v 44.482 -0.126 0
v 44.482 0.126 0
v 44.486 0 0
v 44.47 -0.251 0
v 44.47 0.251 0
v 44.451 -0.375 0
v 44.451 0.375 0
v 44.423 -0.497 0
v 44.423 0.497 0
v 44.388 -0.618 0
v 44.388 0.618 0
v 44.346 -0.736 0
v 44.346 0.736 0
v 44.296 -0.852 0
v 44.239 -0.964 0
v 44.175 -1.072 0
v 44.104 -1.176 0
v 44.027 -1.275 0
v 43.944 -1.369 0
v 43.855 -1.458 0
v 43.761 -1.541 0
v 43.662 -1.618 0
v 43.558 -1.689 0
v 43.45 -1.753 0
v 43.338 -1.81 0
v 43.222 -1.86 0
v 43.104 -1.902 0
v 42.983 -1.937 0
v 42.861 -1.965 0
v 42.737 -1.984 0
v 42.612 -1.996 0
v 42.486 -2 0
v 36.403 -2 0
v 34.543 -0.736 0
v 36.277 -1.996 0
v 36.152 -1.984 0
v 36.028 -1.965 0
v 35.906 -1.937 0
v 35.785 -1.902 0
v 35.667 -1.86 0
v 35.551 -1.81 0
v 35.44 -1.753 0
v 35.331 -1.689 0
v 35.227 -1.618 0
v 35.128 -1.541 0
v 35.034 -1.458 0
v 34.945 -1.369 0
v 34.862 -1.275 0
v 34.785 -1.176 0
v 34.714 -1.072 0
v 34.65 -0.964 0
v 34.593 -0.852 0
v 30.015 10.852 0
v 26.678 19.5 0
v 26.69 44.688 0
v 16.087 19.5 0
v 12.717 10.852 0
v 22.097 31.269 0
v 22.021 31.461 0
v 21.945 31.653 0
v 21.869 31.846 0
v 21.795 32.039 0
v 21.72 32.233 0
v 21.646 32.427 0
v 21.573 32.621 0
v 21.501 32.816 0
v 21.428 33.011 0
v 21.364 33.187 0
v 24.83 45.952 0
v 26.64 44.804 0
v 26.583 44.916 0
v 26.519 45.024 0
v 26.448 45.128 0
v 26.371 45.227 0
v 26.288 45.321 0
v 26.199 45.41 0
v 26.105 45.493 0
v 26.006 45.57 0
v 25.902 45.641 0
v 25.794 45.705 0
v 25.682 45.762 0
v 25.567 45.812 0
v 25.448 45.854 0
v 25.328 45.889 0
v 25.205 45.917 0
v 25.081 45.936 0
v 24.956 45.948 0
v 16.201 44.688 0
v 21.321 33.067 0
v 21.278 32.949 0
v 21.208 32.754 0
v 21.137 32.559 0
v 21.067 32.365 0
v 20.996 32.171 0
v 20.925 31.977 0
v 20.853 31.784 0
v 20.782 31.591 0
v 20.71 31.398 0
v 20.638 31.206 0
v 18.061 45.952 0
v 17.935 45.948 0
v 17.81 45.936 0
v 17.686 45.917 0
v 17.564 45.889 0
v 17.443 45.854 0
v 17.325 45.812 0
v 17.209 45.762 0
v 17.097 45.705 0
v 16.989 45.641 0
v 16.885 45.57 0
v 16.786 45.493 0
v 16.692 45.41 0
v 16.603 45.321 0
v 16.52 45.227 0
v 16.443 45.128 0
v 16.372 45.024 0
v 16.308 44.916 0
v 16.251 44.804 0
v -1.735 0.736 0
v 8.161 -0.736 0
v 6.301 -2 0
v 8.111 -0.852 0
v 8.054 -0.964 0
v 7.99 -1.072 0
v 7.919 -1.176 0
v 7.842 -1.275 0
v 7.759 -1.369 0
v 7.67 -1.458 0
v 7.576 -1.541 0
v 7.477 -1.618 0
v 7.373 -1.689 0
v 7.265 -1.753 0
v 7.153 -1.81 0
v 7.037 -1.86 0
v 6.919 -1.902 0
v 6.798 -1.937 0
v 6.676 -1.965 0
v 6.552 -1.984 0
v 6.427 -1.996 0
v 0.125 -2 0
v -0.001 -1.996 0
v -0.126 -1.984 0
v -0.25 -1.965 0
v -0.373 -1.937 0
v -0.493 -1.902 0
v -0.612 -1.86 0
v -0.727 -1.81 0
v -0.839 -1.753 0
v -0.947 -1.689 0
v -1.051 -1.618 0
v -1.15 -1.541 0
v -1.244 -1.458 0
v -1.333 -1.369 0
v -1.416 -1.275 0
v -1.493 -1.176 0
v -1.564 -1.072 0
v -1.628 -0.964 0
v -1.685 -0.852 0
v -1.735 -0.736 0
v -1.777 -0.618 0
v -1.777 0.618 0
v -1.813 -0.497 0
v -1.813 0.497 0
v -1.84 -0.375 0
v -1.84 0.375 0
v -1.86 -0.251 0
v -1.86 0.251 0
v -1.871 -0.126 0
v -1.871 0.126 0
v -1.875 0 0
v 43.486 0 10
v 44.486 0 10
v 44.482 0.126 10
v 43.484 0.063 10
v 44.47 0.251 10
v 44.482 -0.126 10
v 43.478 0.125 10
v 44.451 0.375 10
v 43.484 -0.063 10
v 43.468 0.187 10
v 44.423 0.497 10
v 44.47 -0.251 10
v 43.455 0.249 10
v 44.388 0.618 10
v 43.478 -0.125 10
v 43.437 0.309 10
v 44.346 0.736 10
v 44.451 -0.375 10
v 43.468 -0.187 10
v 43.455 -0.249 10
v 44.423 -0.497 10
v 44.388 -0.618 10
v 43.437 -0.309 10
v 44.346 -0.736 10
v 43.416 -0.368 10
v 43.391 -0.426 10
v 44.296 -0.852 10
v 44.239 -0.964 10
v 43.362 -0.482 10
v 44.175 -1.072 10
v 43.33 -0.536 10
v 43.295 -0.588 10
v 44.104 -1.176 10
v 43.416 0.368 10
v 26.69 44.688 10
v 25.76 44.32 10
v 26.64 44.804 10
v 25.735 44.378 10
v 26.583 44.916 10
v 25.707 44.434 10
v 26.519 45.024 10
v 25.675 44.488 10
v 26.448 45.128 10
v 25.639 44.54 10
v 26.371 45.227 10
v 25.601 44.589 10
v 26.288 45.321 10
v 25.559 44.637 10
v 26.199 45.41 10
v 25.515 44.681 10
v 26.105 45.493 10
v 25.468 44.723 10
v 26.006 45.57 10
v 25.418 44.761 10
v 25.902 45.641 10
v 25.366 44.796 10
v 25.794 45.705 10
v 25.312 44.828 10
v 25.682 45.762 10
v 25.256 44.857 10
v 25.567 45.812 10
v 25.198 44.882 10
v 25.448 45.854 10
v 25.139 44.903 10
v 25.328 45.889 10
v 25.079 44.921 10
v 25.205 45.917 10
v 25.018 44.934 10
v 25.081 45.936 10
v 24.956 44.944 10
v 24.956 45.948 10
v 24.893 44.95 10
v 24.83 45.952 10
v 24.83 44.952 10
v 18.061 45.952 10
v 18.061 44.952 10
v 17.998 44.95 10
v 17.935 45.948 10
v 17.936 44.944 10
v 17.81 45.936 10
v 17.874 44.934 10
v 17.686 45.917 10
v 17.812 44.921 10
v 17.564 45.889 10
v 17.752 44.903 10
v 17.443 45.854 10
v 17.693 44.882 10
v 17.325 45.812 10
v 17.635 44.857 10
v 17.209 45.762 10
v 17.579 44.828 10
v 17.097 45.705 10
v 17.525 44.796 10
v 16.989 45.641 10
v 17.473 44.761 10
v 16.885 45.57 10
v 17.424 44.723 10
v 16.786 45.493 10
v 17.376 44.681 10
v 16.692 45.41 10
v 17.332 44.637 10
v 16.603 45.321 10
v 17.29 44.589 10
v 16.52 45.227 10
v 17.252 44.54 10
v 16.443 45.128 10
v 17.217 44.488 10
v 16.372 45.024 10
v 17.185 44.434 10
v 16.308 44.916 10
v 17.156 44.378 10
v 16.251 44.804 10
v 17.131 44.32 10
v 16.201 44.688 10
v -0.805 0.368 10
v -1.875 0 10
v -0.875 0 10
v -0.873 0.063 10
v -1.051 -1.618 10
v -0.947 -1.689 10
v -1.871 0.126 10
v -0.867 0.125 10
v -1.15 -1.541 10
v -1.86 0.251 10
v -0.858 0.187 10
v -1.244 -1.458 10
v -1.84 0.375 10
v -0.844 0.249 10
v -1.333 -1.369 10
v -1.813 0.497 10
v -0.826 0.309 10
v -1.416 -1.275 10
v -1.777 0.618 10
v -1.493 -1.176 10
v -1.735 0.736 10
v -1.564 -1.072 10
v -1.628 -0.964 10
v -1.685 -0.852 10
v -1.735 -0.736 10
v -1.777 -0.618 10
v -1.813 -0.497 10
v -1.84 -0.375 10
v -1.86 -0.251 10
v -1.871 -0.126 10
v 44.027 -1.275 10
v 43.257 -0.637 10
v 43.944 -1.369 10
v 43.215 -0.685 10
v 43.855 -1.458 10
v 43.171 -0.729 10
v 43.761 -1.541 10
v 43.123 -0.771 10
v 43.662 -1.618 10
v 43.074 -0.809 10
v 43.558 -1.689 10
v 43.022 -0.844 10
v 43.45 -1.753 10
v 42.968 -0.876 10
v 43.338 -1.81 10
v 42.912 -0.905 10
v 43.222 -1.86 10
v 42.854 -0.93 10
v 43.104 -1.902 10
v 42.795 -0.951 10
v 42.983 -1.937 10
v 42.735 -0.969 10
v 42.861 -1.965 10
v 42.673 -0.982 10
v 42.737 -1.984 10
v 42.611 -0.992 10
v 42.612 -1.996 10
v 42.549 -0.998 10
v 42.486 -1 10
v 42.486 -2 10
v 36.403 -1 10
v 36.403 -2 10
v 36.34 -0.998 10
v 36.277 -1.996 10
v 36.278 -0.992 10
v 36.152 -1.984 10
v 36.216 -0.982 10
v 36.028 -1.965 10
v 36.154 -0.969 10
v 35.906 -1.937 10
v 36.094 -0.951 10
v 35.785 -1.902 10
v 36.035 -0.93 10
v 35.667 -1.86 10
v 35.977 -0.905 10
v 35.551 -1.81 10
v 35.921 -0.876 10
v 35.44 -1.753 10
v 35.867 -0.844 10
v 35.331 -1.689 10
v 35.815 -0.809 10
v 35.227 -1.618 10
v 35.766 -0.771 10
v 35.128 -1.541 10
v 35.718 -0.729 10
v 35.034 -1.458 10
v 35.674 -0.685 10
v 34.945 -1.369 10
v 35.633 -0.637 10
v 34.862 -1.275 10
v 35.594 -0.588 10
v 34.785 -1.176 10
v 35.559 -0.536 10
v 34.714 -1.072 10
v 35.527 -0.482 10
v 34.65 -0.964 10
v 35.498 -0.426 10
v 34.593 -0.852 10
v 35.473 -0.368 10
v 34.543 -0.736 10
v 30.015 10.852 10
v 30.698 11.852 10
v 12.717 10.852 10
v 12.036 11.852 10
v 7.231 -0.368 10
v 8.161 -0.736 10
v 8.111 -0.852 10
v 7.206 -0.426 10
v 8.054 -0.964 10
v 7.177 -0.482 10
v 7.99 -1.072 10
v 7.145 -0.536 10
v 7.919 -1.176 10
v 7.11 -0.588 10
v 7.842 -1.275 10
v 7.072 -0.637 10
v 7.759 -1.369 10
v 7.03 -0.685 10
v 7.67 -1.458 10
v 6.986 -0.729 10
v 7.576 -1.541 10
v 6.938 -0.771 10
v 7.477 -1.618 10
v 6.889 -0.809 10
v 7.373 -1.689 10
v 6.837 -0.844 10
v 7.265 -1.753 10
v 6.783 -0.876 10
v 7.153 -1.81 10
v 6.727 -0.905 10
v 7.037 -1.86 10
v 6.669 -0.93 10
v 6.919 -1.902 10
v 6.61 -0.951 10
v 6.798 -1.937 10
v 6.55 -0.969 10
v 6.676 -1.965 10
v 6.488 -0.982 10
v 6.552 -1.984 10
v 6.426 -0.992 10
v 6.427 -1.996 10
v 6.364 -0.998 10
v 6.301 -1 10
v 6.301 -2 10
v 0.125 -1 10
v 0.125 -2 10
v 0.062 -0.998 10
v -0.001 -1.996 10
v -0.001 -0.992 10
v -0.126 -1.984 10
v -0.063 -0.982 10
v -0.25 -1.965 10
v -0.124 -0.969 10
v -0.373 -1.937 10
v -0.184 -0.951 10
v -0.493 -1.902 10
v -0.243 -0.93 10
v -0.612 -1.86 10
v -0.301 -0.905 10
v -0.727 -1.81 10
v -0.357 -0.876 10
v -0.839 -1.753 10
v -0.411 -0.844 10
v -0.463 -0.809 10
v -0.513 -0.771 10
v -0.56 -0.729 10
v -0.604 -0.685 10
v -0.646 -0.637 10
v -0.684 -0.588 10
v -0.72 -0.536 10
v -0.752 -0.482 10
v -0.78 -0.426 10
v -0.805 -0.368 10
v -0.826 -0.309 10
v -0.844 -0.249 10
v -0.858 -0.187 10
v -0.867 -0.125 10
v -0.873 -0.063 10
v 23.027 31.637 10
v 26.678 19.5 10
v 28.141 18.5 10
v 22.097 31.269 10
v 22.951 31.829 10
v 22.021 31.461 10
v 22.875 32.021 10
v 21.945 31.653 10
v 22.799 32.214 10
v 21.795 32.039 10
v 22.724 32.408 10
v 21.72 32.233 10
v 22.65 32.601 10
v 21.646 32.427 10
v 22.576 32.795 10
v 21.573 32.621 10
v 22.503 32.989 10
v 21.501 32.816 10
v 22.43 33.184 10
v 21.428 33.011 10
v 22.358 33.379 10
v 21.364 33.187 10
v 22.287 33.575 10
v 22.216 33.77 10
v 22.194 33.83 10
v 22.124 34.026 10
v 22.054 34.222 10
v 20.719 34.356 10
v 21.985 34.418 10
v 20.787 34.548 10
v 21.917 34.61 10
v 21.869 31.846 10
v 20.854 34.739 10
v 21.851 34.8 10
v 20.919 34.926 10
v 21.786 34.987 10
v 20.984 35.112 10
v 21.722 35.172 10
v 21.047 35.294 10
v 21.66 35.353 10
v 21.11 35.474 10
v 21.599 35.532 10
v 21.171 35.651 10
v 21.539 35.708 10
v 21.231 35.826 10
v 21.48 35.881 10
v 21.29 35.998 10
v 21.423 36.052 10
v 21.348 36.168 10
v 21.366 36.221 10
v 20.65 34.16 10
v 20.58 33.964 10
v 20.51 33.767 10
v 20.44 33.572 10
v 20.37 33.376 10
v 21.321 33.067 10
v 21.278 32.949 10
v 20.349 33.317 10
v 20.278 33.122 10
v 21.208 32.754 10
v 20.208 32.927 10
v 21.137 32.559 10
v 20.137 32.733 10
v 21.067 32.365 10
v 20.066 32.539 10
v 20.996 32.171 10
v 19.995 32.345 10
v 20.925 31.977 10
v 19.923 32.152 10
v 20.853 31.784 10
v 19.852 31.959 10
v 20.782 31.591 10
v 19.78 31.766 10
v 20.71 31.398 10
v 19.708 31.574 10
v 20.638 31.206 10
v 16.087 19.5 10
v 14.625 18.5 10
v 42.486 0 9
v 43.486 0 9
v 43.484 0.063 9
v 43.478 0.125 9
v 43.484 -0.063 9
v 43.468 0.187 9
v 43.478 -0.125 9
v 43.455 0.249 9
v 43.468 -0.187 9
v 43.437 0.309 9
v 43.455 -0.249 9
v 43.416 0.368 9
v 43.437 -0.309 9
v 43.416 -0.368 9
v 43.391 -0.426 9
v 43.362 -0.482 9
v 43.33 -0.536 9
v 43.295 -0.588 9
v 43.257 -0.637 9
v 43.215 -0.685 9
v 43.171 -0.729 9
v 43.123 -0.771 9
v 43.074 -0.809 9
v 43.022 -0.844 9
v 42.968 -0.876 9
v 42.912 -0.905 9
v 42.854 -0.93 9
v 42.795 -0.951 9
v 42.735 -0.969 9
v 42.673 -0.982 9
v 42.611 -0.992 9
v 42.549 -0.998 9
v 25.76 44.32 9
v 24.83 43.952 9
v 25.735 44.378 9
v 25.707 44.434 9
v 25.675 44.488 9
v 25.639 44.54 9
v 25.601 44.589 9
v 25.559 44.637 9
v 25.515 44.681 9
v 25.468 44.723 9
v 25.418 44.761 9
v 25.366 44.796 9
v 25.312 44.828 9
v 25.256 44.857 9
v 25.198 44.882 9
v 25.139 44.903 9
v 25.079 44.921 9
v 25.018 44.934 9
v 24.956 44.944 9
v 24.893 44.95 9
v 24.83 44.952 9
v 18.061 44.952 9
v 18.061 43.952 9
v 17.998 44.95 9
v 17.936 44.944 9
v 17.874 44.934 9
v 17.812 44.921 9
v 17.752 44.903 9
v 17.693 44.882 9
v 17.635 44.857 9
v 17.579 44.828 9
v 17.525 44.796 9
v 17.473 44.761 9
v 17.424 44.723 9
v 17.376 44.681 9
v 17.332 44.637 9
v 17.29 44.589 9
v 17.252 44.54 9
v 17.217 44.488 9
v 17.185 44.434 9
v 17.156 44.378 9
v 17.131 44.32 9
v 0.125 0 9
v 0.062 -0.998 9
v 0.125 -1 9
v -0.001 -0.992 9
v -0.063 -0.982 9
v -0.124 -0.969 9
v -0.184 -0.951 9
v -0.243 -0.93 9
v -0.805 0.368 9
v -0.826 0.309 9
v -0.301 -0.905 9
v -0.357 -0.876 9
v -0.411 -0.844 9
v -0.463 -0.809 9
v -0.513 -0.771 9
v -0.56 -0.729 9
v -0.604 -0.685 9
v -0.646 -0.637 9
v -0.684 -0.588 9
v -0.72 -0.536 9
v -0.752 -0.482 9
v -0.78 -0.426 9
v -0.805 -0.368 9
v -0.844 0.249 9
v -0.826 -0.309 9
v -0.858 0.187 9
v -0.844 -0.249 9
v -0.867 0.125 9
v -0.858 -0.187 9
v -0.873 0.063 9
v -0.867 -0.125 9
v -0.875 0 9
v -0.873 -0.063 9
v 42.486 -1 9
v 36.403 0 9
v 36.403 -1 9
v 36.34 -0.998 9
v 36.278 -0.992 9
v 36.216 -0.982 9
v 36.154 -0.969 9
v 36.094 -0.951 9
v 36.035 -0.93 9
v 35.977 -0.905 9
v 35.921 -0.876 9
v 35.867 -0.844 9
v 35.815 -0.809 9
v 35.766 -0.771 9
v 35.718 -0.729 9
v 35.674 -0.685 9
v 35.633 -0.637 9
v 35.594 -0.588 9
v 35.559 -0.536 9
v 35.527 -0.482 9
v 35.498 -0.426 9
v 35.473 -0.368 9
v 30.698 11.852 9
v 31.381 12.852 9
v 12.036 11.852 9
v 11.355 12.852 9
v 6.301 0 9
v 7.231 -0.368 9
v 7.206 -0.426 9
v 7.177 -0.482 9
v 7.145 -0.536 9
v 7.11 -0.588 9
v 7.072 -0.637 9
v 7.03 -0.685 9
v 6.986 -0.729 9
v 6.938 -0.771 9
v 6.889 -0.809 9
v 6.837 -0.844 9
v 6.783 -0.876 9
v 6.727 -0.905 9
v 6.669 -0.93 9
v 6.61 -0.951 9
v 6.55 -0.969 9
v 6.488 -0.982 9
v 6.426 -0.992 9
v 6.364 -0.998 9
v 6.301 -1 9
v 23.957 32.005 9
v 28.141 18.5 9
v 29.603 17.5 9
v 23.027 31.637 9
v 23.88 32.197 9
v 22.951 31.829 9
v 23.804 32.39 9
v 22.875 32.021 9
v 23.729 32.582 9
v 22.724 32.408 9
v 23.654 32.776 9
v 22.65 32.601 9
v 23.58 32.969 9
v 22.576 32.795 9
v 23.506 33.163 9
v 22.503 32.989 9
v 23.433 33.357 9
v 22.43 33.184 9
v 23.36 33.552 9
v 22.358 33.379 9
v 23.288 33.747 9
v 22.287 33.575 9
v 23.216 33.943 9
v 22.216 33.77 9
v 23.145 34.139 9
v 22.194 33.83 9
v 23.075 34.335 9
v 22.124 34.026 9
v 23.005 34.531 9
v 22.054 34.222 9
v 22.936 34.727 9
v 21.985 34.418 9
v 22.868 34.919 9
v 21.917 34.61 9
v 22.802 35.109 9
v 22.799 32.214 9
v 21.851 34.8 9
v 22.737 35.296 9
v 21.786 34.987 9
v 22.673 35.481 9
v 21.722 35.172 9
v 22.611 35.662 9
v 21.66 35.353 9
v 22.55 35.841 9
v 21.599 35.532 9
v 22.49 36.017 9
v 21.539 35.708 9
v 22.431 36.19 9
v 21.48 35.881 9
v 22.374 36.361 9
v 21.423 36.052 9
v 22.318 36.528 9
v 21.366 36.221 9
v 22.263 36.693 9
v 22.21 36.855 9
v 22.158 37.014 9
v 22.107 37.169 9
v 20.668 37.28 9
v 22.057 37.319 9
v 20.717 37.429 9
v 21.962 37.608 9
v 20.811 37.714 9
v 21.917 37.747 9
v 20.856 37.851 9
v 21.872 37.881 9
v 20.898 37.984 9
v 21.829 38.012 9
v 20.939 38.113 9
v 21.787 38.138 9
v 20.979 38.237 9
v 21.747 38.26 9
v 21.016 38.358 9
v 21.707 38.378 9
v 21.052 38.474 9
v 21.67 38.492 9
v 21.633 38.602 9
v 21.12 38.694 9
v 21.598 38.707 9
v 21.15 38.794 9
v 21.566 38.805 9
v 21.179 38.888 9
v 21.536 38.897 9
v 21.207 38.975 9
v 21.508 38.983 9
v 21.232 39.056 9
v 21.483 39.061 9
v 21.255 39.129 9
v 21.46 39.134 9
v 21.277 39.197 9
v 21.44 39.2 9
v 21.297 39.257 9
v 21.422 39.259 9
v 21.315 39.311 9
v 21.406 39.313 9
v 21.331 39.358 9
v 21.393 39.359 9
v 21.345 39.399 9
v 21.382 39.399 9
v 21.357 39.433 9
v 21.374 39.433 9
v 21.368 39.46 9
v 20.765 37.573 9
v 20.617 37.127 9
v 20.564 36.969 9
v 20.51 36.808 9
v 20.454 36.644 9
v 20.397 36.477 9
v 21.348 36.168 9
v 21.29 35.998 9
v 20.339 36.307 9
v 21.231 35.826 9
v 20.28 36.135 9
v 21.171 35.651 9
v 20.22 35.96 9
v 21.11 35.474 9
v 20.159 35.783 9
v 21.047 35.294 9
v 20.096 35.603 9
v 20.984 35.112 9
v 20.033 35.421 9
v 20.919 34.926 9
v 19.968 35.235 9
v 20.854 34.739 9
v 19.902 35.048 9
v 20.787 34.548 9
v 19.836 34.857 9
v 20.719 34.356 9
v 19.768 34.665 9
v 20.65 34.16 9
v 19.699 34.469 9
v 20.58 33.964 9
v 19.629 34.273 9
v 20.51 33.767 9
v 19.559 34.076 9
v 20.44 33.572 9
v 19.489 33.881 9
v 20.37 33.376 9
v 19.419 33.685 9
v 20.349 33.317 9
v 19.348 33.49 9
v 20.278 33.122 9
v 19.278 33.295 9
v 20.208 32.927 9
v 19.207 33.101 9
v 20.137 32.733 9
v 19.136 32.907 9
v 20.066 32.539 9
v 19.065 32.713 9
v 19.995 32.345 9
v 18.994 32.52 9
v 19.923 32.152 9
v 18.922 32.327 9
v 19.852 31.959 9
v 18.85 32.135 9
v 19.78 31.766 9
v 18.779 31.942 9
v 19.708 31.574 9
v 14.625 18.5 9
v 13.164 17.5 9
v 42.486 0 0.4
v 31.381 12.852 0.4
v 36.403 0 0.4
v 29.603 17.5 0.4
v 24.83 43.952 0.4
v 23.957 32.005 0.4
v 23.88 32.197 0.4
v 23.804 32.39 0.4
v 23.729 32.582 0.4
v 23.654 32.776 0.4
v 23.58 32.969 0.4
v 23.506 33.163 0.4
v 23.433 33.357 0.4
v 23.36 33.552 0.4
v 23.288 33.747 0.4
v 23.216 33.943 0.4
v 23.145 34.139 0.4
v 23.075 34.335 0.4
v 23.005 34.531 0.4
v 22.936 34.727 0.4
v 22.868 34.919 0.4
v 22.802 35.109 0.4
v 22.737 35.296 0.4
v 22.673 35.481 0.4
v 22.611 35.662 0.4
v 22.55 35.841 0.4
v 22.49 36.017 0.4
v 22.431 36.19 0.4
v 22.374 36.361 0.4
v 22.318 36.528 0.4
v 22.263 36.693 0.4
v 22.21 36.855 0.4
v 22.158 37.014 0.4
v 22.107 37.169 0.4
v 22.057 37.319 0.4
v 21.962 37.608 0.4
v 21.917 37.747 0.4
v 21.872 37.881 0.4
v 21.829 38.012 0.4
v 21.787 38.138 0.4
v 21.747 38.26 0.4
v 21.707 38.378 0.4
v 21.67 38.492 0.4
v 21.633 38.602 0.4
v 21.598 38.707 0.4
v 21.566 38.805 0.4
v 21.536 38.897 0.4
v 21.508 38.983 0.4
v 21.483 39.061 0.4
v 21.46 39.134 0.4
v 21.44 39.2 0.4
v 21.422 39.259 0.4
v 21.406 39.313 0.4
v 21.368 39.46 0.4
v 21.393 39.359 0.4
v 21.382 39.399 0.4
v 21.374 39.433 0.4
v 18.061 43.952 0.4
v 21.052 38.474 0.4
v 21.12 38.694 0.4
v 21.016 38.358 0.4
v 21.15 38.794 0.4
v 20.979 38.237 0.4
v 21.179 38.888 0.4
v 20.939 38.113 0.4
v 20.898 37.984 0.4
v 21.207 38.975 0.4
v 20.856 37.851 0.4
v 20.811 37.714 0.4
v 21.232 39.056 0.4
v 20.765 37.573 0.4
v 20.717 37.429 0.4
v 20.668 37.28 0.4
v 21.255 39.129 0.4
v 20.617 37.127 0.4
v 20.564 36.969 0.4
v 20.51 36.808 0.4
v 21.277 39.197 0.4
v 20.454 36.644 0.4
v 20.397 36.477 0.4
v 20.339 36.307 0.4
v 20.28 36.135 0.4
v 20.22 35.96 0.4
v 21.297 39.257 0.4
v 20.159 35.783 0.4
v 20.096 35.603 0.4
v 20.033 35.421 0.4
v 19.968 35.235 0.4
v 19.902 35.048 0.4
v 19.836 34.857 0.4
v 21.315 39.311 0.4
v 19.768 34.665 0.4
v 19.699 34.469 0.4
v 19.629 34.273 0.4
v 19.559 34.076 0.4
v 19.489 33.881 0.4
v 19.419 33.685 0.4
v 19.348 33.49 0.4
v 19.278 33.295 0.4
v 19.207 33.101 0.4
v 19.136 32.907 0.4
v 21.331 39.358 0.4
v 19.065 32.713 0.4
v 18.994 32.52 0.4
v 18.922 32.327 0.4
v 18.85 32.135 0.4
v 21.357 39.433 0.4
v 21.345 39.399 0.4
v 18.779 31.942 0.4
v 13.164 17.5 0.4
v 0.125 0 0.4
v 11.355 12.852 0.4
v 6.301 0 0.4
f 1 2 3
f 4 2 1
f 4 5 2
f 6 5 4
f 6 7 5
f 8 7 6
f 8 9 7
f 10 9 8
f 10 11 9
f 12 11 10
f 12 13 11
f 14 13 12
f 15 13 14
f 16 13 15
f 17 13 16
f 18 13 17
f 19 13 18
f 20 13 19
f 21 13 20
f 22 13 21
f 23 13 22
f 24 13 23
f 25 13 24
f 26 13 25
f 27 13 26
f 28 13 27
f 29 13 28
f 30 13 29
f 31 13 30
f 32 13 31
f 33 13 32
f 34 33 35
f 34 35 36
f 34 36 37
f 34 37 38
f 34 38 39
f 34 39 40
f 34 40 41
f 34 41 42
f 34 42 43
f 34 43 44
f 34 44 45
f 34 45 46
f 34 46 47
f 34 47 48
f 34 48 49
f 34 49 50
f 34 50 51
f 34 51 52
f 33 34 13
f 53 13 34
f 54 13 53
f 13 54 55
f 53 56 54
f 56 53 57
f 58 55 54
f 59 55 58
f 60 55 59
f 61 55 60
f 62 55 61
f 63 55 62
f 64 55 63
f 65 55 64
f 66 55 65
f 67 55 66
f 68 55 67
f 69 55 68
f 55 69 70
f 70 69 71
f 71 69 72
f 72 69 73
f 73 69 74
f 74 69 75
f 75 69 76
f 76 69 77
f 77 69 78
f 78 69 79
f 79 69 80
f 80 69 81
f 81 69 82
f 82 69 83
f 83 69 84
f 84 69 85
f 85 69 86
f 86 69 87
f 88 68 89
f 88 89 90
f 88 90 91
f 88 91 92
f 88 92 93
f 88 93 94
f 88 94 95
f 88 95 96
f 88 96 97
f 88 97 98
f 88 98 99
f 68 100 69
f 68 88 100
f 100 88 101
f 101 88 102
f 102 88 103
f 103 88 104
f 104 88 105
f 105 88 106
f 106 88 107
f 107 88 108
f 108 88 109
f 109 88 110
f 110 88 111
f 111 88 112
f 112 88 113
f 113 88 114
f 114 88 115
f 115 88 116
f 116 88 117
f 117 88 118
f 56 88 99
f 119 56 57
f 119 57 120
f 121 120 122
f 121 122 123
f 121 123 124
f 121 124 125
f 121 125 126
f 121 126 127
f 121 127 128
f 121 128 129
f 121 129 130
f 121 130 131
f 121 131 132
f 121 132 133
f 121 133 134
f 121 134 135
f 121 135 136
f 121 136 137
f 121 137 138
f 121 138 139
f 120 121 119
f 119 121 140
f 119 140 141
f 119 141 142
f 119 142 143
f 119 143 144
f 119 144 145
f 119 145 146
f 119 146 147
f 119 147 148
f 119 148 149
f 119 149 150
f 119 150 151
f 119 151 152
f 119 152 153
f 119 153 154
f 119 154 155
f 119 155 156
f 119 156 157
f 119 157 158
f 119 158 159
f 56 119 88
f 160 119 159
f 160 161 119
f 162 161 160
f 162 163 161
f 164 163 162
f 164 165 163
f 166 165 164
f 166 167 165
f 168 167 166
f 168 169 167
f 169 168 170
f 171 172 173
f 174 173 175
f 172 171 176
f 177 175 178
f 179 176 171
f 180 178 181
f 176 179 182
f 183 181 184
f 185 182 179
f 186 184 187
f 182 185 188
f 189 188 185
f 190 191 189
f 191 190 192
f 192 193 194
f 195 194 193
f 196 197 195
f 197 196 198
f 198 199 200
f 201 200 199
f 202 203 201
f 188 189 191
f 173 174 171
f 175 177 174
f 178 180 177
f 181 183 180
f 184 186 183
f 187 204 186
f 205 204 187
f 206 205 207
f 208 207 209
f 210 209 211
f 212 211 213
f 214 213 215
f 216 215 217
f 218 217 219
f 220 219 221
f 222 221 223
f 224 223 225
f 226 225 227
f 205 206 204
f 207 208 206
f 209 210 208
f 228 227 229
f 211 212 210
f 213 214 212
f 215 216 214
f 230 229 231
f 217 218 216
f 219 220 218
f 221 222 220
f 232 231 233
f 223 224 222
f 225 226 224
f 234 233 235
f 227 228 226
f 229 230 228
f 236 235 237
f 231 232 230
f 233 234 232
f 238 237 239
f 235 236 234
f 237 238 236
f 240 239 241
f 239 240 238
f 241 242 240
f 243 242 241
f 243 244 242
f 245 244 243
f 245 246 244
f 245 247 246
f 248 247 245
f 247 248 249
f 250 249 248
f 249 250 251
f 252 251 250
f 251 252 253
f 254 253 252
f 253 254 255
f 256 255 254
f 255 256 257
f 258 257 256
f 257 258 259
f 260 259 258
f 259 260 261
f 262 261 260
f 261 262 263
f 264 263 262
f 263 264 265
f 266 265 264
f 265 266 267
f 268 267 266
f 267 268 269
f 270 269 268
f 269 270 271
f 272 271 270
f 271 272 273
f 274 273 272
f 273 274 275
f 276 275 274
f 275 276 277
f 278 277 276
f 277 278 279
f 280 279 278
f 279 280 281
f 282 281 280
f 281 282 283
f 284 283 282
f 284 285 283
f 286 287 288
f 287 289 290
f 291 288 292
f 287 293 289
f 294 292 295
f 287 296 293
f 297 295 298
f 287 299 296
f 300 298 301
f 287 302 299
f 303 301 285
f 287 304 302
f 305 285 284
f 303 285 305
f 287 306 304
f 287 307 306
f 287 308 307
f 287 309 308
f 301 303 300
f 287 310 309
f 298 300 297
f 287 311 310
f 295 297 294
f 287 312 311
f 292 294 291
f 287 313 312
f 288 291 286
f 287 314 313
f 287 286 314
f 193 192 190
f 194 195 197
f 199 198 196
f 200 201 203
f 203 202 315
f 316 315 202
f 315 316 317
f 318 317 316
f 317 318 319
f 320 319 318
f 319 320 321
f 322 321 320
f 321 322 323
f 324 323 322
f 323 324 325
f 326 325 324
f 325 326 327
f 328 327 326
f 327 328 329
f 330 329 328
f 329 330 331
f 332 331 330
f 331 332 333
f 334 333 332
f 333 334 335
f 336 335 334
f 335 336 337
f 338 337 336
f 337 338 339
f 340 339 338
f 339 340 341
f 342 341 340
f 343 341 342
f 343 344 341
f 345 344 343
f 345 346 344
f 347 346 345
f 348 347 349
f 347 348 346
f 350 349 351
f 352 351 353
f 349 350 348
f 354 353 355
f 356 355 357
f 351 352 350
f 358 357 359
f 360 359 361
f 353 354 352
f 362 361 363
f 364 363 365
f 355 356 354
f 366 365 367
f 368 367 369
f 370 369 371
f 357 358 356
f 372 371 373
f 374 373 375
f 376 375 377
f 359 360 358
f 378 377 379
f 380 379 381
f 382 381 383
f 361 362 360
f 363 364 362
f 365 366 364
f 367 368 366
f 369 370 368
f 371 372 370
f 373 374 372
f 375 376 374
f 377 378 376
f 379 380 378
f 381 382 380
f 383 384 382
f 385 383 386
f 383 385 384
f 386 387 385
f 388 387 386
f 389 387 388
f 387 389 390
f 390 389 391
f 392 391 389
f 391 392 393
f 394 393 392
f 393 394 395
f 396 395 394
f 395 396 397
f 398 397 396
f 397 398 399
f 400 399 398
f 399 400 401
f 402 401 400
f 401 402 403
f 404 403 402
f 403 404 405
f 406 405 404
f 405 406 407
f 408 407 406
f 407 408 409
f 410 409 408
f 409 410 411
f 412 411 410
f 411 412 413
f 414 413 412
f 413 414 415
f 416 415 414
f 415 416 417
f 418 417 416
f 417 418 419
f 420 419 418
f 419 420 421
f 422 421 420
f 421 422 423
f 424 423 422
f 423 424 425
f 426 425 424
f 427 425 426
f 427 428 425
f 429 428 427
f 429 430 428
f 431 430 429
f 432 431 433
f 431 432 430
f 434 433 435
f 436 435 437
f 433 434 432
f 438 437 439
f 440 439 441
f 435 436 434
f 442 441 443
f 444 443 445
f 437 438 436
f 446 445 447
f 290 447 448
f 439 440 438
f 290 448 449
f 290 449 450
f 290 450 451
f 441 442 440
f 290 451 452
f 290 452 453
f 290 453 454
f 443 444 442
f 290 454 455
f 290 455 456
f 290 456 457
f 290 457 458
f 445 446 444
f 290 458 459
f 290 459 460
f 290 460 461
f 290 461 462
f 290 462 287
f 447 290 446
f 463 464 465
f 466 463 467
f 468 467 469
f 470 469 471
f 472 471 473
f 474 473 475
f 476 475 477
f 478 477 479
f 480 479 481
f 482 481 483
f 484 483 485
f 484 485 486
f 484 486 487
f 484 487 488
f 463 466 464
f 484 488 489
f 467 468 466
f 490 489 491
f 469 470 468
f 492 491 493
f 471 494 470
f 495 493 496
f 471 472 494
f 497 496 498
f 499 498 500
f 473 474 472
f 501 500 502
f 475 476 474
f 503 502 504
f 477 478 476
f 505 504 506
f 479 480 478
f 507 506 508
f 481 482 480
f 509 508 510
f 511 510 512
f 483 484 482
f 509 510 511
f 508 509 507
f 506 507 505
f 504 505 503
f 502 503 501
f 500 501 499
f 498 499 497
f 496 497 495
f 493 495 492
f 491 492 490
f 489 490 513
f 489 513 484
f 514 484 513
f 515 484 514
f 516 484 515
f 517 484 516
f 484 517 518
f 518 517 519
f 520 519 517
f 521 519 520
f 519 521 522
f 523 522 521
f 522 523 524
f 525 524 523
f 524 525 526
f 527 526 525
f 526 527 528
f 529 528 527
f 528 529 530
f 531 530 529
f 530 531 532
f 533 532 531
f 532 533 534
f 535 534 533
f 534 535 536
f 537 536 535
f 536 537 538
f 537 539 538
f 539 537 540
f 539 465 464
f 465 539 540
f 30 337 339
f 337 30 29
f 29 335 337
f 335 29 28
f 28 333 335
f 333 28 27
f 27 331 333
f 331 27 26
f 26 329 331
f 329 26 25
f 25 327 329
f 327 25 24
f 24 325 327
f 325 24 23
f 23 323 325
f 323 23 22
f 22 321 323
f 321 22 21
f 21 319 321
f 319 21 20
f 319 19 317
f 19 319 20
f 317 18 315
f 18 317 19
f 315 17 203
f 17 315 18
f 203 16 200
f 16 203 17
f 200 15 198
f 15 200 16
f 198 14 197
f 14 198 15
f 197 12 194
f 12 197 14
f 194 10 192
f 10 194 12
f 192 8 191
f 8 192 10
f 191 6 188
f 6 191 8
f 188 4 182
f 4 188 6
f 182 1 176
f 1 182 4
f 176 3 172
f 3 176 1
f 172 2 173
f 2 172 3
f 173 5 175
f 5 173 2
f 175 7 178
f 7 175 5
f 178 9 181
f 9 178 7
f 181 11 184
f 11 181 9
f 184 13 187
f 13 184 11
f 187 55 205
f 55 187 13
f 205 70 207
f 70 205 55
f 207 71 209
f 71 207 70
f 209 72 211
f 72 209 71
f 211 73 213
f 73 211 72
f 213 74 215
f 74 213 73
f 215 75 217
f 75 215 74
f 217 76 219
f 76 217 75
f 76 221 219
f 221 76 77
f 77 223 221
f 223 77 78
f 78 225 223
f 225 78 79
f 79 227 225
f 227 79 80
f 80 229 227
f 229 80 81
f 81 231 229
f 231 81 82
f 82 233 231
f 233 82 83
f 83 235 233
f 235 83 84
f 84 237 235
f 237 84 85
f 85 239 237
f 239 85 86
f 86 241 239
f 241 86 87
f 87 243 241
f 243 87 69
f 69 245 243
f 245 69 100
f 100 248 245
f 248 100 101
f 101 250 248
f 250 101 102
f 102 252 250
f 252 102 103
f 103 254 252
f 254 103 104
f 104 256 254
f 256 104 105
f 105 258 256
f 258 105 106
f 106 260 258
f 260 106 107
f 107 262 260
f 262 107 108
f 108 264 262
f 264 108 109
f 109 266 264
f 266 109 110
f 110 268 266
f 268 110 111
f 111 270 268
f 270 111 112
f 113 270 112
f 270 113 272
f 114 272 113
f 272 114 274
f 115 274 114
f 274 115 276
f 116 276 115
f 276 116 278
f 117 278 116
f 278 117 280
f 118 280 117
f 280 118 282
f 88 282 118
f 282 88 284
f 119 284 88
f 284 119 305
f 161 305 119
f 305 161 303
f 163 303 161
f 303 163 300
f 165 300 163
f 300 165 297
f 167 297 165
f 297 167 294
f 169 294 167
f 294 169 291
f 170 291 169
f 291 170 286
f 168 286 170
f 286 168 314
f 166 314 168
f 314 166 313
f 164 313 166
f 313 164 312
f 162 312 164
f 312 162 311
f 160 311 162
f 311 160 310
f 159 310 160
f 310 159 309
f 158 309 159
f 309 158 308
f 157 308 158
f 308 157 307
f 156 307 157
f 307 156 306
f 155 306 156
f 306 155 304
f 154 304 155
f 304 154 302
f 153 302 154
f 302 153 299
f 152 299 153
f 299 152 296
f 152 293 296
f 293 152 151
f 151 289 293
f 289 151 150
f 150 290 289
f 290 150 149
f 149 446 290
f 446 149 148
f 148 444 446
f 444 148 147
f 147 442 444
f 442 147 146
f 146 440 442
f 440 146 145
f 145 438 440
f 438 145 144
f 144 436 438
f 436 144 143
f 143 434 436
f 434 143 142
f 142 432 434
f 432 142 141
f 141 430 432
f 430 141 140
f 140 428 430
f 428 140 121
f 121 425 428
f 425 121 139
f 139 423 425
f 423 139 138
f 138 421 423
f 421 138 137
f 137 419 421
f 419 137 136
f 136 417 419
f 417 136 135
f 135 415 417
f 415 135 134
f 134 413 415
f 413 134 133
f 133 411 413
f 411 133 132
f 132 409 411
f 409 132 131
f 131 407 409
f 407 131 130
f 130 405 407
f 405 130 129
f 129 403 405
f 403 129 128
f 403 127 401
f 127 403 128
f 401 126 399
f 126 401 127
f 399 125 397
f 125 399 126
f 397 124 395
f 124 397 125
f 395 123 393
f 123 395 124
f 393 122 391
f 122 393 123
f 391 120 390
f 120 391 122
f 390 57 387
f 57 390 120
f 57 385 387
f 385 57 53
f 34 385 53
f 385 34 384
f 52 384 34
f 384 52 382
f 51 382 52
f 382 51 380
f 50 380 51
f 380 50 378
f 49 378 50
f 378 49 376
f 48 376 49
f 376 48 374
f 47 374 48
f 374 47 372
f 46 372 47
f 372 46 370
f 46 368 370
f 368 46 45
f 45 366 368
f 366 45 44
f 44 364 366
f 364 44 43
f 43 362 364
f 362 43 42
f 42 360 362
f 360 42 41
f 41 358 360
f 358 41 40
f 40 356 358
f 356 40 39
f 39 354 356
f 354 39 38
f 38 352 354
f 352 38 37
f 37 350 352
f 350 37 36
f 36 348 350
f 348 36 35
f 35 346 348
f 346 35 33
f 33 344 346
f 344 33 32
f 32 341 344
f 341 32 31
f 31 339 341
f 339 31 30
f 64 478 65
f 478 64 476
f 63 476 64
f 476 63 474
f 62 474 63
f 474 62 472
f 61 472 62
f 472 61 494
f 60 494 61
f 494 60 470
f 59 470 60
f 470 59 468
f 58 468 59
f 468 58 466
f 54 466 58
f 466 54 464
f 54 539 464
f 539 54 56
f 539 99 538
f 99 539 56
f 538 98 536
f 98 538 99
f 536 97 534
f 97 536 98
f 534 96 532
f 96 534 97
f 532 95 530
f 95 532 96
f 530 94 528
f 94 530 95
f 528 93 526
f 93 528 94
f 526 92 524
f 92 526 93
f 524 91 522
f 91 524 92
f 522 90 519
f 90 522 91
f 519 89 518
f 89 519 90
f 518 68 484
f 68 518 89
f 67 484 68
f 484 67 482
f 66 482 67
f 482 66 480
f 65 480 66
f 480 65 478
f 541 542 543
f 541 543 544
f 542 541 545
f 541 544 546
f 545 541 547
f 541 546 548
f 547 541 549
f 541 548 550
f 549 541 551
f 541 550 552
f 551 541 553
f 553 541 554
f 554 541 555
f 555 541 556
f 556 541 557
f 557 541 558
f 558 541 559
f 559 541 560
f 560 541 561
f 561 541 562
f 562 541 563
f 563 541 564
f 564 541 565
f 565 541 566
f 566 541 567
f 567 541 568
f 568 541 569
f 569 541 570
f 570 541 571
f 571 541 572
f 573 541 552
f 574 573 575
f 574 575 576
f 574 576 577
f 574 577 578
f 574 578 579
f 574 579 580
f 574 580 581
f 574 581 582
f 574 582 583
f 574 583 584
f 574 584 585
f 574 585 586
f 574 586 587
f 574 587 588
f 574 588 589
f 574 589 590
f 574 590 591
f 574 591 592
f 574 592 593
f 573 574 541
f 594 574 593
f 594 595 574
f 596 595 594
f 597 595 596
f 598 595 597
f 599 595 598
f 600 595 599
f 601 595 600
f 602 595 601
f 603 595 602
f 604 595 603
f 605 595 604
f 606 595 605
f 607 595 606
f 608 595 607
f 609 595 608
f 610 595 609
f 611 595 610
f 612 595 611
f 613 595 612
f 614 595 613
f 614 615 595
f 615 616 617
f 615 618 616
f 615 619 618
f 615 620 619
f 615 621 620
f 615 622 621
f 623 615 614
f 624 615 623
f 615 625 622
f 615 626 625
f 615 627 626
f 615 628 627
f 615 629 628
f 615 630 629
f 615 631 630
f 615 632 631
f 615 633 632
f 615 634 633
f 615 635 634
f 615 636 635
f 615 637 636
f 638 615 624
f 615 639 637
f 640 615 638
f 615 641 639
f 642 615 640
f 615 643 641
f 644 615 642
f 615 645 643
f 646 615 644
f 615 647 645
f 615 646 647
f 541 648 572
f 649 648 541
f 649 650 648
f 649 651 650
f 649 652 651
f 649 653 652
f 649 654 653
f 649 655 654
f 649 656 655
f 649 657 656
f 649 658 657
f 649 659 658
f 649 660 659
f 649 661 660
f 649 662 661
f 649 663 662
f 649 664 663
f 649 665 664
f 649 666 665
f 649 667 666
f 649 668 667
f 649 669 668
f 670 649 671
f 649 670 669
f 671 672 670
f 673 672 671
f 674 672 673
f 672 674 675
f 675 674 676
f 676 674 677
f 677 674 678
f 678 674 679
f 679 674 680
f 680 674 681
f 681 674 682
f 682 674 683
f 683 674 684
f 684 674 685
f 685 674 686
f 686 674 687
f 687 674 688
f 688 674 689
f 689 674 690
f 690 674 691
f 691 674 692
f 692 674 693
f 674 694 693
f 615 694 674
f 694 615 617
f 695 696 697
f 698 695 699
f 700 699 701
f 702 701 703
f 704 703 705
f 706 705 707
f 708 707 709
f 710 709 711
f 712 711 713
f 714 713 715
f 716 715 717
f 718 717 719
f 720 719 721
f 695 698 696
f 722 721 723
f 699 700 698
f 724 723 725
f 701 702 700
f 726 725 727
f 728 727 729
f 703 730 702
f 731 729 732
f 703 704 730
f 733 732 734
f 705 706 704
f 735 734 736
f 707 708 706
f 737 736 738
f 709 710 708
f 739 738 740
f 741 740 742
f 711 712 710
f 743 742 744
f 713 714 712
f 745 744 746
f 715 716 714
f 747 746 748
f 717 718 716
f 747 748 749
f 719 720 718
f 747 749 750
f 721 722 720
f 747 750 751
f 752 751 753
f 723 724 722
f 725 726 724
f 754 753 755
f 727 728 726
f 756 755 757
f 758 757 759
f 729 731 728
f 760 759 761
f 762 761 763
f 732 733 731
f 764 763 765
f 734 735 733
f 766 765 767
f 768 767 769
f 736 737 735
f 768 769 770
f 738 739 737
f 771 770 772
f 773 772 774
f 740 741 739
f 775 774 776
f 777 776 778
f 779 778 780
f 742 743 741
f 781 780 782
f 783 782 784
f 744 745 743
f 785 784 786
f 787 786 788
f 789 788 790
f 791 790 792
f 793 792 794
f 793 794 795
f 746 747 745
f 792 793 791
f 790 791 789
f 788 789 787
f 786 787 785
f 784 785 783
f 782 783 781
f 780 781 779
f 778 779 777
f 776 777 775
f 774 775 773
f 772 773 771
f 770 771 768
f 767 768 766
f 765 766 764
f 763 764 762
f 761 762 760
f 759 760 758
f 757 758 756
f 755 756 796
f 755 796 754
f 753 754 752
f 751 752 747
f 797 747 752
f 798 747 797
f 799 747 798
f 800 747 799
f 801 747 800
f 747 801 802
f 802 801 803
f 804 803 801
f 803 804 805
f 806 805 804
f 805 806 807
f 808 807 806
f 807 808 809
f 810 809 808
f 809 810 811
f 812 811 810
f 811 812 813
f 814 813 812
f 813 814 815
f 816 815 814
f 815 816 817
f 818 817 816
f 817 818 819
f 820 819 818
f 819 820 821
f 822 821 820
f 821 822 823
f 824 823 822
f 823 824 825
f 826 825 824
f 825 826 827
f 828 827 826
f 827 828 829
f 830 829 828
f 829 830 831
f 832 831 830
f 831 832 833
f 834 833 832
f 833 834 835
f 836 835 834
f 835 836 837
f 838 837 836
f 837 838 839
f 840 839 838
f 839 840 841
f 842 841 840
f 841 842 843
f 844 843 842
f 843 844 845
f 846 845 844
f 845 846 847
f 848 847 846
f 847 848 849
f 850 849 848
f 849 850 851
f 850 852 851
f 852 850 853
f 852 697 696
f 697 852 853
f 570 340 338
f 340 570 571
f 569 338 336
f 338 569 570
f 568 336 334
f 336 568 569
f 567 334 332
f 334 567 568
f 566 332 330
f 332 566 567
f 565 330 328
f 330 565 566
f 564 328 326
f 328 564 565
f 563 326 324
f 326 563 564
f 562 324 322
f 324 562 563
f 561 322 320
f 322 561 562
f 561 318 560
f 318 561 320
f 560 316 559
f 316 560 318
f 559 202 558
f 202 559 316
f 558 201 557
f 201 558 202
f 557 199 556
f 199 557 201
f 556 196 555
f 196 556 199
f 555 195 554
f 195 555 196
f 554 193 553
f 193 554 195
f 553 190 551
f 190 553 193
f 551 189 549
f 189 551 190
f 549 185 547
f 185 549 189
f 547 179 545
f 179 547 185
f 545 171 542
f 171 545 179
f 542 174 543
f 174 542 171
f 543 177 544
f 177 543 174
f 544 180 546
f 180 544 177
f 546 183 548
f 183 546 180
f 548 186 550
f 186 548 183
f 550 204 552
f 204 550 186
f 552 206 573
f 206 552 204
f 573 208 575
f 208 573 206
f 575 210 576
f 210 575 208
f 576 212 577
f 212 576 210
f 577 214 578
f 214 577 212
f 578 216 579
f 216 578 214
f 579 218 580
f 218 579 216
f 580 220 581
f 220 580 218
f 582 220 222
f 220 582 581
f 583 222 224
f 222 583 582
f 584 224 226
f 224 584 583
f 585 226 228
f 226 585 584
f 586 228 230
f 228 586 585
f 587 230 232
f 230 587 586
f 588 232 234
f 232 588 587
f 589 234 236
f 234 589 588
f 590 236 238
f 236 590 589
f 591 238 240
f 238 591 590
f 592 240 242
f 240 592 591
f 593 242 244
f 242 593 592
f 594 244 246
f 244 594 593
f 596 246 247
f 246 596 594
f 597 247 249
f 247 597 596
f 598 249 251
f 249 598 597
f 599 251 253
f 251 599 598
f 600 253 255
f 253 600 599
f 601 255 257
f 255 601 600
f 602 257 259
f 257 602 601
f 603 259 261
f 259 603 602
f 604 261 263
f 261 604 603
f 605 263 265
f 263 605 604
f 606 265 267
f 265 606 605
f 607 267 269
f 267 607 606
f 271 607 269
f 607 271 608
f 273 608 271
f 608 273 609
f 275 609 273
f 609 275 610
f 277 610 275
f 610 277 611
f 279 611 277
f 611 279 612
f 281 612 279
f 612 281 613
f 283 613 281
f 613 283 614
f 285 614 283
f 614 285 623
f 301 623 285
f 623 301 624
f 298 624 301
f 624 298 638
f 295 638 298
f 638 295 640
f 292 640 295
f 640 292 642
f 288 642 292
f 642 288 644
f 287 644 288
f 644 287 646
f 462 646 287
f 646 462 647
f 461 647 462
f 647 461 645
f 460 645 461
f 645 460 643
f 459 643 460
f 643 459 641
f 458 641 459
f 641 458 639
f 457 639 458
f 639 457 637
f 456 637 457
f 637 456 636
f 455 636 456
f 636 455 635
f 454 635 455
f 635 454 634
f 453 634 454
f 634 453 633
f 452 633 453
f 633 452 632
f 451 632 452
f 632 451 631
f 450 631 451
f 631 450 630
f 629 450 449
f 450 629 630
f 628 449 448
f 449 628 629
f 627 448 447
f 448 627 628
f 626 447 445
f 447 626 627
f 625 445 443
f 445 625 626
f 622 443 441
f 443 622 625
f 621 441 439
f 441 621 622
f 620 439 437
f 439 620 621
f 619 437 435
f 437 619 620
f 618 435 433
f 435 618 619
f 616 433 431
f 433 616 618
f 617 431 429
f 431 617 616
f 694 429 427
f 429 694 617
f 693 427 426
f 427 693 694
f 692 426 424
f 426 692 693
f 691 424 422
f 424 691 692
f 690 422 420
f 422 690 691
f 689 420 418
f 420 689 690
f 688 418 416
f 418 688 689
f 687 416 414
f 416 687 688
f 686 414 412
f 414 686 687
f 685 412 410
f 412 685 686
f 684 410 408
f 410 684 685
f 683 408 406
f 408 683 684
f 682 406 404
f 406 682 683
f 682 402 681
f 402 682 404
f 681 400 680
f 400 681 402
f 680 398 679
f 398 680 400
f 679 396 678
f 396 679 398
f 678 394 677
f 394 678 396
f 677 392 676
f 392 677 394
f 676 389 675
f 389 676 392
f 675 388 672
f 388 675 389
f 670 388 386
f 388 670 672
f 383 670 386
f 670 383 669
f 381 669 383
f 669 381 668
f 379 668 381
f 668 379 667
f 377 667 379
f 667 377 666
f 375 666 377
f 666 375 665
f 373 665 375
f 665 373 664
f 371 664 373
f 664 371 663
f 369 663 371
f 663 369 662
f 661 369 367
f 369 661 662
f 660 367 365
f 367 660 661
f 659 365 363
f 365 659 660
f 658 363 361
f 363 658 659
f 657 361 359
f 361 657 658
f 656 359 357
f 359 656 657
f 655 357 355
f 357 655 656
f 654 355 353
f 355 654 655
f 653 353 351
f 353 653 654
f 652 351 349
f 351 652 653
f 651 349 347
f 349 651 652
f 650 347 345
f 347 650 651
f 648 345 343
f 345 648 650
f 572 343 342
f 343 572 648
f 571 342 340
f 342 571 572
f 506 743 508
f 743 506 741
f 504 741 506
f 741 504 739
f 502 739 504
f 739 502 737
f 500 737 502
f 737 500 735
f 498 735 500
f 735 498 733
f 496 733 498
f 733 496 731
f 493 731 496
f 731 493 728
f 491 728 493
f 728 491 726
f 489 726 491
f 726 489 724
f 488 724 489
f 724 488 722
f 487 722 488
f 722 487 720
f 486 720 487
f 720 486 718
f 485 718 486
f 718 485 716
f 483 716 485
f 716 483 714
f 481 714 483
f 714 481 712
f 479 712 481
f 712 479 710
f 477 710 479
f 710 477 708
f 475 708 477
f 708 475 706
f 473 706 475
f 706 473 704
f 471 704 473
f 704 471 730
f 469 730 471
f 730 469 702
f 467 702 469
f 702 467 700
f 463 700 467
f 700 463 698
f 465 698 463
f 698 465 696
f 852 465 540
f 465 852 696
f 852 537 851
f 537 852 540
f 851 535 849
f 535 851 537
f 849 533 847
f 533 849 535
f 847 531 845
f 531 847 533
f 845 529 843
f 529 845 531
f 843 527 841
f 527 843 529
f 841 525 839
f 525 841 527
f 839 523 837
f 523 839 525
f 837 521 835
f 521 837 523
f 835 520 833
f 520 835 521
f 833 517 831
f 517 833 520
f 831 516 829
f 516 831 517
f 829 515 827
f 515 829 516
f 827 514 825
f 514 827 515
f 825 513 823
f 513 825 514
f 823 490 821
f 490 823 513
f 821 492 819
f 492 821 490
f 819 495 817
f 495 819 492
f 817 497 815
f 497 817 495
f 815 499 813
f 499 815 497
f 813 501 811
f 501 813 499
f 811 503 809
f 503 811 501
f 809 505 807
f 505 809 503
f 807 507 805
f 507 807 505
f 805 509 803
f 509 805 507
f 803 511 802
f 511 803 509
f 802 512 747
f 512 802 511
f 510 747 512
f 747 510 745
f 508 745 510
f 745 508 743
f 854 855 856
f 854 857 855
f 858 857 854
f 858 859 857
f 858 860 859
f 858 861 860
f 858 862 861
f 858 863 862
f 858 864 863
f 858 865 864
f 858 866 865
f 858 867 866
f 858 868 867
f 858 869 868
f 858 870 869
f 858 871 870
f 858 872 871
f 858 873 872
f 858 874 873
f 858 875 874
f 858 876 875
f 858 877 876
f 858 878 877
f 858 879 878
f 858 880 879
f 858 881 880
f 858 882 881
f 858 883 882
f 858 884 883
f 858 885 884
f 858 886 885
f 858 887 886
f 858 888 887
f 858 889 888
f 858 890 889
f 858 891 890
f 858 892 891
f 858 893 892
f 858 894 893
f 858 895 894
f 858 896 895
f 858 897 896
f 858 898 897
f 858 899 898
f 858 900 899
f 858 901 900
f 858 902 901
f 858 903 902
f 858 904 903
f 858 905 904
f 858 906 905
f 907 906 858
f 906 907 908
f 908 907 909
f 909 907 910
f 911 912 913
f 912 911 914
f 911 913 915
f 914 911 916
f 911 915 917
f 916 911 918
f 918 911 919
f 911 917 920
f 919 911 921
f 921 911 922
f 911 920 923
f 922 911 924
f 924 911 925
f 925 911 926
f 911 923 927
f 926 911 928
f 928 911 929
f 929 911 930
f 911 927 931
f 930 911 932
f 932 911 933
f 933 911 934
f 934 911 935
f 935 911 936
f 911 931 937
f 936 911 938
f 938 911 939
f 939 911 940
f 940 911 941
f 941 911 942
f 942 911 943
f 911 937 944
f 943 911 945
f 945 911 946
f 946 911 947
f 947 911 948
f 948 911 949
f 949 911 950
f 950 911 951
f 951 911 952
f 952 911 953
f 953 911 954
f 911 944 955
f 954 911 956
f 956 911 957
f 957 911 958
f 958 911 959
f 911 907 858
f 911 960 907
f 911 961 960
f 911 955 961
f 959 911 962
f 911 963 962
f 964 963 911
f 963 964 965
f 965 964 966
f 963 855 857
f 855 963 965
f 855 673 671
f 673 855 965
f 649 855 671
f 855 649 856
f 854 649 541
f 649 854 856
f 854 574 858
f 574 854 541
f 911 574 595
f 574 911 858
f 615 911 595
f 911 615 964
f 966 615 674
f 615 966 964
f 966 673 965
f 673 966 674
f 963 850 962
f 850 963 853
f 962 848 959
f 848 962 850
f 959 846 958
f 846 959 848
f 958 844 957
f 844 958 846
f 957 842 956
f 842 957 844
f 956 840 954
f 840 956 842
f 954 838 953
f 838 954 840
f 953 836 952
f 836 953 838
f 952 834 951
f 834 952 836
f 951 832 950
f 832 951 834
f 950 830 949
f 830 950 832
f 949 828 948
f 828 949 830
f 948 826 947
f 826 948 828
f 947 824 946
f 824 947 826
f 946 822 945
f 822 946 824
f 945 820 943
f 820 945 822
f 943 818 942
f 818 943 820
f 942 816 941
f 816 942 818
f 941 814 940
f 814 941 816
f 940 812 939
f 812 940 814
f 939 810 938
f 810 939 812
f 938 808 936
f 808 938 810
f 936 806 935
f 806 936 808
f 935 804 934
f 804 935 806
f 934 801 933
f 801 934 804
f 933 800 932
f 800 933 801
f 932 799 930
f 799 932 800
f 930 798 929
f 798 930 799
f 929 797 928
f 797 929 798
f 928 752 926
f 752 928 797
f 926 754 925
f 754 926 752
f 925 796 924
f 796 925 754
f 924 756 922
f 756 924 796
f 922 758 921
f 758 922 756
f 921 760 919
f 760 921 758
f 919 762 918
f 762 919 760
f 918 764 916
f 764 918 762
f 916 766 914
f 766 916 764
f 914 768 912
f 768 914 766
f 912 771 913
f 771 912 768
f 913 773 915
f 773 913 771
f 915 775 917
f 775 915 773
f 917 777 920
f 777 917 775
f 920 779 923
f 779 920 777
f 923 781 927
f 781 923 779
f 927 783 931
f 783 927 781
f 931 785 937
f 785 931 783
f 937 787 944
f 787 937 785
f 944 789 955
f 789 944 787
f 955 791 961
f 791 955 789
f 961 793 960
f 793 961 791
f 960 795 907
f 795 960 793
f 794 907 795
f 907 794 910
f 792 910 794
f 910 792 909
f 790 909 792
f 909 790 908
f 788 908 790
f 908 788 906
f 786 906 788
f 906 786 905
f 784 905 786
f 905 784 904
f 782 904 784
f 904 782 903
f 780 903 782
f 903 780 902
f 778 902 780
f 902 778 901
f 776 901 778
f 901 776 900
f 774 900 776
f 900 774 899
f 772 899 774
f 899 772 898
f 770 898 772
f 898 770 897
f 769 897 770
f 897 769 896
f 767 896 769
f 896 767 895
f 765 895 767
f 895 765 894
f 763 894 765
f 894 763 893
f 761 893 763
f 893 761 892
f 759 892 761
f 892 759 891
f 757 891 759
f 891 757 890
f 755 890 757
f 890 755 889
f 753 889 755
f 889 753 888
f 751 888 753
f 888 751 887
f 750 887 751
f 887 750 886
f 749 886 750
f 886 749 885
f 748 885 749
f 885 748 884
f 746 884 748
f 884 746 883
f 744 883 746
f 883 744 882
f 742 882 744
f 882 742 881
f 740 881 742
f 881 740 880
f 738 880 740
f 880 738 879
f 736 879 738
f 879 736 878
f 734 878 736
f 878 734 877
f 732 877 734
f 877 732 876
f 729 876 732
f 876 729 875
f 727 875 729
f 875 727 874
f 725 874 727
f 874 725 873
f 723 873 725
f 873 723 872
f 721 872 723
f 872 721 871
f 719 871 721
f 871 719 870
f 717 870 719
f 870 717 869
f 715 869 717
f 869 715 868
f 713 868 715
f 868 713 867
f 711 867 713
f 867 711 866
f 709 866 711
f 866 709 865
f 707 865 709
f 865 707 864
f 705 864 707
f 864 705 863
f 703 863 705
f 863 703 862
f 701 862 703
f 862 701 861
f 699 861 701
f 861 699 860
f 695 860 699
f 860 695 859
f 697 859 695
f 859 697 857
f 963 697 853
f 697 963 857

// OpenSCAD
//Sign body maker V3 - bigclivedotcom
letter = "A"; //Sign character to make
style = "Arial"; //See "Help" and "Font List"
size = 50; //Size of character (height)
depth = 10; //Depth of sign character
$fn=100; //Curve facets - higher is smoother
walls = 2; //Side wall thickness
base=.4; //Base thickness (-1 for open back)
face = 1; //Face thickness
//Don't change variables below here
sized=size-(2*walls);
difference(){
linear_extrude(height=depth)
minkowski(){
text(letter,sized,style);
circle(walls);
}
//Lip for front face (half wall thickness)
translate([0,0,depth-face])
linear_extrude(height=2*face)
minkowski(){
text(letter,sized,style);
circle(walls/2);
}
//hollow core of letter
translate([0,0,base])
linear_extrude(height=depth+2)
text(letter,sized,style);
}
